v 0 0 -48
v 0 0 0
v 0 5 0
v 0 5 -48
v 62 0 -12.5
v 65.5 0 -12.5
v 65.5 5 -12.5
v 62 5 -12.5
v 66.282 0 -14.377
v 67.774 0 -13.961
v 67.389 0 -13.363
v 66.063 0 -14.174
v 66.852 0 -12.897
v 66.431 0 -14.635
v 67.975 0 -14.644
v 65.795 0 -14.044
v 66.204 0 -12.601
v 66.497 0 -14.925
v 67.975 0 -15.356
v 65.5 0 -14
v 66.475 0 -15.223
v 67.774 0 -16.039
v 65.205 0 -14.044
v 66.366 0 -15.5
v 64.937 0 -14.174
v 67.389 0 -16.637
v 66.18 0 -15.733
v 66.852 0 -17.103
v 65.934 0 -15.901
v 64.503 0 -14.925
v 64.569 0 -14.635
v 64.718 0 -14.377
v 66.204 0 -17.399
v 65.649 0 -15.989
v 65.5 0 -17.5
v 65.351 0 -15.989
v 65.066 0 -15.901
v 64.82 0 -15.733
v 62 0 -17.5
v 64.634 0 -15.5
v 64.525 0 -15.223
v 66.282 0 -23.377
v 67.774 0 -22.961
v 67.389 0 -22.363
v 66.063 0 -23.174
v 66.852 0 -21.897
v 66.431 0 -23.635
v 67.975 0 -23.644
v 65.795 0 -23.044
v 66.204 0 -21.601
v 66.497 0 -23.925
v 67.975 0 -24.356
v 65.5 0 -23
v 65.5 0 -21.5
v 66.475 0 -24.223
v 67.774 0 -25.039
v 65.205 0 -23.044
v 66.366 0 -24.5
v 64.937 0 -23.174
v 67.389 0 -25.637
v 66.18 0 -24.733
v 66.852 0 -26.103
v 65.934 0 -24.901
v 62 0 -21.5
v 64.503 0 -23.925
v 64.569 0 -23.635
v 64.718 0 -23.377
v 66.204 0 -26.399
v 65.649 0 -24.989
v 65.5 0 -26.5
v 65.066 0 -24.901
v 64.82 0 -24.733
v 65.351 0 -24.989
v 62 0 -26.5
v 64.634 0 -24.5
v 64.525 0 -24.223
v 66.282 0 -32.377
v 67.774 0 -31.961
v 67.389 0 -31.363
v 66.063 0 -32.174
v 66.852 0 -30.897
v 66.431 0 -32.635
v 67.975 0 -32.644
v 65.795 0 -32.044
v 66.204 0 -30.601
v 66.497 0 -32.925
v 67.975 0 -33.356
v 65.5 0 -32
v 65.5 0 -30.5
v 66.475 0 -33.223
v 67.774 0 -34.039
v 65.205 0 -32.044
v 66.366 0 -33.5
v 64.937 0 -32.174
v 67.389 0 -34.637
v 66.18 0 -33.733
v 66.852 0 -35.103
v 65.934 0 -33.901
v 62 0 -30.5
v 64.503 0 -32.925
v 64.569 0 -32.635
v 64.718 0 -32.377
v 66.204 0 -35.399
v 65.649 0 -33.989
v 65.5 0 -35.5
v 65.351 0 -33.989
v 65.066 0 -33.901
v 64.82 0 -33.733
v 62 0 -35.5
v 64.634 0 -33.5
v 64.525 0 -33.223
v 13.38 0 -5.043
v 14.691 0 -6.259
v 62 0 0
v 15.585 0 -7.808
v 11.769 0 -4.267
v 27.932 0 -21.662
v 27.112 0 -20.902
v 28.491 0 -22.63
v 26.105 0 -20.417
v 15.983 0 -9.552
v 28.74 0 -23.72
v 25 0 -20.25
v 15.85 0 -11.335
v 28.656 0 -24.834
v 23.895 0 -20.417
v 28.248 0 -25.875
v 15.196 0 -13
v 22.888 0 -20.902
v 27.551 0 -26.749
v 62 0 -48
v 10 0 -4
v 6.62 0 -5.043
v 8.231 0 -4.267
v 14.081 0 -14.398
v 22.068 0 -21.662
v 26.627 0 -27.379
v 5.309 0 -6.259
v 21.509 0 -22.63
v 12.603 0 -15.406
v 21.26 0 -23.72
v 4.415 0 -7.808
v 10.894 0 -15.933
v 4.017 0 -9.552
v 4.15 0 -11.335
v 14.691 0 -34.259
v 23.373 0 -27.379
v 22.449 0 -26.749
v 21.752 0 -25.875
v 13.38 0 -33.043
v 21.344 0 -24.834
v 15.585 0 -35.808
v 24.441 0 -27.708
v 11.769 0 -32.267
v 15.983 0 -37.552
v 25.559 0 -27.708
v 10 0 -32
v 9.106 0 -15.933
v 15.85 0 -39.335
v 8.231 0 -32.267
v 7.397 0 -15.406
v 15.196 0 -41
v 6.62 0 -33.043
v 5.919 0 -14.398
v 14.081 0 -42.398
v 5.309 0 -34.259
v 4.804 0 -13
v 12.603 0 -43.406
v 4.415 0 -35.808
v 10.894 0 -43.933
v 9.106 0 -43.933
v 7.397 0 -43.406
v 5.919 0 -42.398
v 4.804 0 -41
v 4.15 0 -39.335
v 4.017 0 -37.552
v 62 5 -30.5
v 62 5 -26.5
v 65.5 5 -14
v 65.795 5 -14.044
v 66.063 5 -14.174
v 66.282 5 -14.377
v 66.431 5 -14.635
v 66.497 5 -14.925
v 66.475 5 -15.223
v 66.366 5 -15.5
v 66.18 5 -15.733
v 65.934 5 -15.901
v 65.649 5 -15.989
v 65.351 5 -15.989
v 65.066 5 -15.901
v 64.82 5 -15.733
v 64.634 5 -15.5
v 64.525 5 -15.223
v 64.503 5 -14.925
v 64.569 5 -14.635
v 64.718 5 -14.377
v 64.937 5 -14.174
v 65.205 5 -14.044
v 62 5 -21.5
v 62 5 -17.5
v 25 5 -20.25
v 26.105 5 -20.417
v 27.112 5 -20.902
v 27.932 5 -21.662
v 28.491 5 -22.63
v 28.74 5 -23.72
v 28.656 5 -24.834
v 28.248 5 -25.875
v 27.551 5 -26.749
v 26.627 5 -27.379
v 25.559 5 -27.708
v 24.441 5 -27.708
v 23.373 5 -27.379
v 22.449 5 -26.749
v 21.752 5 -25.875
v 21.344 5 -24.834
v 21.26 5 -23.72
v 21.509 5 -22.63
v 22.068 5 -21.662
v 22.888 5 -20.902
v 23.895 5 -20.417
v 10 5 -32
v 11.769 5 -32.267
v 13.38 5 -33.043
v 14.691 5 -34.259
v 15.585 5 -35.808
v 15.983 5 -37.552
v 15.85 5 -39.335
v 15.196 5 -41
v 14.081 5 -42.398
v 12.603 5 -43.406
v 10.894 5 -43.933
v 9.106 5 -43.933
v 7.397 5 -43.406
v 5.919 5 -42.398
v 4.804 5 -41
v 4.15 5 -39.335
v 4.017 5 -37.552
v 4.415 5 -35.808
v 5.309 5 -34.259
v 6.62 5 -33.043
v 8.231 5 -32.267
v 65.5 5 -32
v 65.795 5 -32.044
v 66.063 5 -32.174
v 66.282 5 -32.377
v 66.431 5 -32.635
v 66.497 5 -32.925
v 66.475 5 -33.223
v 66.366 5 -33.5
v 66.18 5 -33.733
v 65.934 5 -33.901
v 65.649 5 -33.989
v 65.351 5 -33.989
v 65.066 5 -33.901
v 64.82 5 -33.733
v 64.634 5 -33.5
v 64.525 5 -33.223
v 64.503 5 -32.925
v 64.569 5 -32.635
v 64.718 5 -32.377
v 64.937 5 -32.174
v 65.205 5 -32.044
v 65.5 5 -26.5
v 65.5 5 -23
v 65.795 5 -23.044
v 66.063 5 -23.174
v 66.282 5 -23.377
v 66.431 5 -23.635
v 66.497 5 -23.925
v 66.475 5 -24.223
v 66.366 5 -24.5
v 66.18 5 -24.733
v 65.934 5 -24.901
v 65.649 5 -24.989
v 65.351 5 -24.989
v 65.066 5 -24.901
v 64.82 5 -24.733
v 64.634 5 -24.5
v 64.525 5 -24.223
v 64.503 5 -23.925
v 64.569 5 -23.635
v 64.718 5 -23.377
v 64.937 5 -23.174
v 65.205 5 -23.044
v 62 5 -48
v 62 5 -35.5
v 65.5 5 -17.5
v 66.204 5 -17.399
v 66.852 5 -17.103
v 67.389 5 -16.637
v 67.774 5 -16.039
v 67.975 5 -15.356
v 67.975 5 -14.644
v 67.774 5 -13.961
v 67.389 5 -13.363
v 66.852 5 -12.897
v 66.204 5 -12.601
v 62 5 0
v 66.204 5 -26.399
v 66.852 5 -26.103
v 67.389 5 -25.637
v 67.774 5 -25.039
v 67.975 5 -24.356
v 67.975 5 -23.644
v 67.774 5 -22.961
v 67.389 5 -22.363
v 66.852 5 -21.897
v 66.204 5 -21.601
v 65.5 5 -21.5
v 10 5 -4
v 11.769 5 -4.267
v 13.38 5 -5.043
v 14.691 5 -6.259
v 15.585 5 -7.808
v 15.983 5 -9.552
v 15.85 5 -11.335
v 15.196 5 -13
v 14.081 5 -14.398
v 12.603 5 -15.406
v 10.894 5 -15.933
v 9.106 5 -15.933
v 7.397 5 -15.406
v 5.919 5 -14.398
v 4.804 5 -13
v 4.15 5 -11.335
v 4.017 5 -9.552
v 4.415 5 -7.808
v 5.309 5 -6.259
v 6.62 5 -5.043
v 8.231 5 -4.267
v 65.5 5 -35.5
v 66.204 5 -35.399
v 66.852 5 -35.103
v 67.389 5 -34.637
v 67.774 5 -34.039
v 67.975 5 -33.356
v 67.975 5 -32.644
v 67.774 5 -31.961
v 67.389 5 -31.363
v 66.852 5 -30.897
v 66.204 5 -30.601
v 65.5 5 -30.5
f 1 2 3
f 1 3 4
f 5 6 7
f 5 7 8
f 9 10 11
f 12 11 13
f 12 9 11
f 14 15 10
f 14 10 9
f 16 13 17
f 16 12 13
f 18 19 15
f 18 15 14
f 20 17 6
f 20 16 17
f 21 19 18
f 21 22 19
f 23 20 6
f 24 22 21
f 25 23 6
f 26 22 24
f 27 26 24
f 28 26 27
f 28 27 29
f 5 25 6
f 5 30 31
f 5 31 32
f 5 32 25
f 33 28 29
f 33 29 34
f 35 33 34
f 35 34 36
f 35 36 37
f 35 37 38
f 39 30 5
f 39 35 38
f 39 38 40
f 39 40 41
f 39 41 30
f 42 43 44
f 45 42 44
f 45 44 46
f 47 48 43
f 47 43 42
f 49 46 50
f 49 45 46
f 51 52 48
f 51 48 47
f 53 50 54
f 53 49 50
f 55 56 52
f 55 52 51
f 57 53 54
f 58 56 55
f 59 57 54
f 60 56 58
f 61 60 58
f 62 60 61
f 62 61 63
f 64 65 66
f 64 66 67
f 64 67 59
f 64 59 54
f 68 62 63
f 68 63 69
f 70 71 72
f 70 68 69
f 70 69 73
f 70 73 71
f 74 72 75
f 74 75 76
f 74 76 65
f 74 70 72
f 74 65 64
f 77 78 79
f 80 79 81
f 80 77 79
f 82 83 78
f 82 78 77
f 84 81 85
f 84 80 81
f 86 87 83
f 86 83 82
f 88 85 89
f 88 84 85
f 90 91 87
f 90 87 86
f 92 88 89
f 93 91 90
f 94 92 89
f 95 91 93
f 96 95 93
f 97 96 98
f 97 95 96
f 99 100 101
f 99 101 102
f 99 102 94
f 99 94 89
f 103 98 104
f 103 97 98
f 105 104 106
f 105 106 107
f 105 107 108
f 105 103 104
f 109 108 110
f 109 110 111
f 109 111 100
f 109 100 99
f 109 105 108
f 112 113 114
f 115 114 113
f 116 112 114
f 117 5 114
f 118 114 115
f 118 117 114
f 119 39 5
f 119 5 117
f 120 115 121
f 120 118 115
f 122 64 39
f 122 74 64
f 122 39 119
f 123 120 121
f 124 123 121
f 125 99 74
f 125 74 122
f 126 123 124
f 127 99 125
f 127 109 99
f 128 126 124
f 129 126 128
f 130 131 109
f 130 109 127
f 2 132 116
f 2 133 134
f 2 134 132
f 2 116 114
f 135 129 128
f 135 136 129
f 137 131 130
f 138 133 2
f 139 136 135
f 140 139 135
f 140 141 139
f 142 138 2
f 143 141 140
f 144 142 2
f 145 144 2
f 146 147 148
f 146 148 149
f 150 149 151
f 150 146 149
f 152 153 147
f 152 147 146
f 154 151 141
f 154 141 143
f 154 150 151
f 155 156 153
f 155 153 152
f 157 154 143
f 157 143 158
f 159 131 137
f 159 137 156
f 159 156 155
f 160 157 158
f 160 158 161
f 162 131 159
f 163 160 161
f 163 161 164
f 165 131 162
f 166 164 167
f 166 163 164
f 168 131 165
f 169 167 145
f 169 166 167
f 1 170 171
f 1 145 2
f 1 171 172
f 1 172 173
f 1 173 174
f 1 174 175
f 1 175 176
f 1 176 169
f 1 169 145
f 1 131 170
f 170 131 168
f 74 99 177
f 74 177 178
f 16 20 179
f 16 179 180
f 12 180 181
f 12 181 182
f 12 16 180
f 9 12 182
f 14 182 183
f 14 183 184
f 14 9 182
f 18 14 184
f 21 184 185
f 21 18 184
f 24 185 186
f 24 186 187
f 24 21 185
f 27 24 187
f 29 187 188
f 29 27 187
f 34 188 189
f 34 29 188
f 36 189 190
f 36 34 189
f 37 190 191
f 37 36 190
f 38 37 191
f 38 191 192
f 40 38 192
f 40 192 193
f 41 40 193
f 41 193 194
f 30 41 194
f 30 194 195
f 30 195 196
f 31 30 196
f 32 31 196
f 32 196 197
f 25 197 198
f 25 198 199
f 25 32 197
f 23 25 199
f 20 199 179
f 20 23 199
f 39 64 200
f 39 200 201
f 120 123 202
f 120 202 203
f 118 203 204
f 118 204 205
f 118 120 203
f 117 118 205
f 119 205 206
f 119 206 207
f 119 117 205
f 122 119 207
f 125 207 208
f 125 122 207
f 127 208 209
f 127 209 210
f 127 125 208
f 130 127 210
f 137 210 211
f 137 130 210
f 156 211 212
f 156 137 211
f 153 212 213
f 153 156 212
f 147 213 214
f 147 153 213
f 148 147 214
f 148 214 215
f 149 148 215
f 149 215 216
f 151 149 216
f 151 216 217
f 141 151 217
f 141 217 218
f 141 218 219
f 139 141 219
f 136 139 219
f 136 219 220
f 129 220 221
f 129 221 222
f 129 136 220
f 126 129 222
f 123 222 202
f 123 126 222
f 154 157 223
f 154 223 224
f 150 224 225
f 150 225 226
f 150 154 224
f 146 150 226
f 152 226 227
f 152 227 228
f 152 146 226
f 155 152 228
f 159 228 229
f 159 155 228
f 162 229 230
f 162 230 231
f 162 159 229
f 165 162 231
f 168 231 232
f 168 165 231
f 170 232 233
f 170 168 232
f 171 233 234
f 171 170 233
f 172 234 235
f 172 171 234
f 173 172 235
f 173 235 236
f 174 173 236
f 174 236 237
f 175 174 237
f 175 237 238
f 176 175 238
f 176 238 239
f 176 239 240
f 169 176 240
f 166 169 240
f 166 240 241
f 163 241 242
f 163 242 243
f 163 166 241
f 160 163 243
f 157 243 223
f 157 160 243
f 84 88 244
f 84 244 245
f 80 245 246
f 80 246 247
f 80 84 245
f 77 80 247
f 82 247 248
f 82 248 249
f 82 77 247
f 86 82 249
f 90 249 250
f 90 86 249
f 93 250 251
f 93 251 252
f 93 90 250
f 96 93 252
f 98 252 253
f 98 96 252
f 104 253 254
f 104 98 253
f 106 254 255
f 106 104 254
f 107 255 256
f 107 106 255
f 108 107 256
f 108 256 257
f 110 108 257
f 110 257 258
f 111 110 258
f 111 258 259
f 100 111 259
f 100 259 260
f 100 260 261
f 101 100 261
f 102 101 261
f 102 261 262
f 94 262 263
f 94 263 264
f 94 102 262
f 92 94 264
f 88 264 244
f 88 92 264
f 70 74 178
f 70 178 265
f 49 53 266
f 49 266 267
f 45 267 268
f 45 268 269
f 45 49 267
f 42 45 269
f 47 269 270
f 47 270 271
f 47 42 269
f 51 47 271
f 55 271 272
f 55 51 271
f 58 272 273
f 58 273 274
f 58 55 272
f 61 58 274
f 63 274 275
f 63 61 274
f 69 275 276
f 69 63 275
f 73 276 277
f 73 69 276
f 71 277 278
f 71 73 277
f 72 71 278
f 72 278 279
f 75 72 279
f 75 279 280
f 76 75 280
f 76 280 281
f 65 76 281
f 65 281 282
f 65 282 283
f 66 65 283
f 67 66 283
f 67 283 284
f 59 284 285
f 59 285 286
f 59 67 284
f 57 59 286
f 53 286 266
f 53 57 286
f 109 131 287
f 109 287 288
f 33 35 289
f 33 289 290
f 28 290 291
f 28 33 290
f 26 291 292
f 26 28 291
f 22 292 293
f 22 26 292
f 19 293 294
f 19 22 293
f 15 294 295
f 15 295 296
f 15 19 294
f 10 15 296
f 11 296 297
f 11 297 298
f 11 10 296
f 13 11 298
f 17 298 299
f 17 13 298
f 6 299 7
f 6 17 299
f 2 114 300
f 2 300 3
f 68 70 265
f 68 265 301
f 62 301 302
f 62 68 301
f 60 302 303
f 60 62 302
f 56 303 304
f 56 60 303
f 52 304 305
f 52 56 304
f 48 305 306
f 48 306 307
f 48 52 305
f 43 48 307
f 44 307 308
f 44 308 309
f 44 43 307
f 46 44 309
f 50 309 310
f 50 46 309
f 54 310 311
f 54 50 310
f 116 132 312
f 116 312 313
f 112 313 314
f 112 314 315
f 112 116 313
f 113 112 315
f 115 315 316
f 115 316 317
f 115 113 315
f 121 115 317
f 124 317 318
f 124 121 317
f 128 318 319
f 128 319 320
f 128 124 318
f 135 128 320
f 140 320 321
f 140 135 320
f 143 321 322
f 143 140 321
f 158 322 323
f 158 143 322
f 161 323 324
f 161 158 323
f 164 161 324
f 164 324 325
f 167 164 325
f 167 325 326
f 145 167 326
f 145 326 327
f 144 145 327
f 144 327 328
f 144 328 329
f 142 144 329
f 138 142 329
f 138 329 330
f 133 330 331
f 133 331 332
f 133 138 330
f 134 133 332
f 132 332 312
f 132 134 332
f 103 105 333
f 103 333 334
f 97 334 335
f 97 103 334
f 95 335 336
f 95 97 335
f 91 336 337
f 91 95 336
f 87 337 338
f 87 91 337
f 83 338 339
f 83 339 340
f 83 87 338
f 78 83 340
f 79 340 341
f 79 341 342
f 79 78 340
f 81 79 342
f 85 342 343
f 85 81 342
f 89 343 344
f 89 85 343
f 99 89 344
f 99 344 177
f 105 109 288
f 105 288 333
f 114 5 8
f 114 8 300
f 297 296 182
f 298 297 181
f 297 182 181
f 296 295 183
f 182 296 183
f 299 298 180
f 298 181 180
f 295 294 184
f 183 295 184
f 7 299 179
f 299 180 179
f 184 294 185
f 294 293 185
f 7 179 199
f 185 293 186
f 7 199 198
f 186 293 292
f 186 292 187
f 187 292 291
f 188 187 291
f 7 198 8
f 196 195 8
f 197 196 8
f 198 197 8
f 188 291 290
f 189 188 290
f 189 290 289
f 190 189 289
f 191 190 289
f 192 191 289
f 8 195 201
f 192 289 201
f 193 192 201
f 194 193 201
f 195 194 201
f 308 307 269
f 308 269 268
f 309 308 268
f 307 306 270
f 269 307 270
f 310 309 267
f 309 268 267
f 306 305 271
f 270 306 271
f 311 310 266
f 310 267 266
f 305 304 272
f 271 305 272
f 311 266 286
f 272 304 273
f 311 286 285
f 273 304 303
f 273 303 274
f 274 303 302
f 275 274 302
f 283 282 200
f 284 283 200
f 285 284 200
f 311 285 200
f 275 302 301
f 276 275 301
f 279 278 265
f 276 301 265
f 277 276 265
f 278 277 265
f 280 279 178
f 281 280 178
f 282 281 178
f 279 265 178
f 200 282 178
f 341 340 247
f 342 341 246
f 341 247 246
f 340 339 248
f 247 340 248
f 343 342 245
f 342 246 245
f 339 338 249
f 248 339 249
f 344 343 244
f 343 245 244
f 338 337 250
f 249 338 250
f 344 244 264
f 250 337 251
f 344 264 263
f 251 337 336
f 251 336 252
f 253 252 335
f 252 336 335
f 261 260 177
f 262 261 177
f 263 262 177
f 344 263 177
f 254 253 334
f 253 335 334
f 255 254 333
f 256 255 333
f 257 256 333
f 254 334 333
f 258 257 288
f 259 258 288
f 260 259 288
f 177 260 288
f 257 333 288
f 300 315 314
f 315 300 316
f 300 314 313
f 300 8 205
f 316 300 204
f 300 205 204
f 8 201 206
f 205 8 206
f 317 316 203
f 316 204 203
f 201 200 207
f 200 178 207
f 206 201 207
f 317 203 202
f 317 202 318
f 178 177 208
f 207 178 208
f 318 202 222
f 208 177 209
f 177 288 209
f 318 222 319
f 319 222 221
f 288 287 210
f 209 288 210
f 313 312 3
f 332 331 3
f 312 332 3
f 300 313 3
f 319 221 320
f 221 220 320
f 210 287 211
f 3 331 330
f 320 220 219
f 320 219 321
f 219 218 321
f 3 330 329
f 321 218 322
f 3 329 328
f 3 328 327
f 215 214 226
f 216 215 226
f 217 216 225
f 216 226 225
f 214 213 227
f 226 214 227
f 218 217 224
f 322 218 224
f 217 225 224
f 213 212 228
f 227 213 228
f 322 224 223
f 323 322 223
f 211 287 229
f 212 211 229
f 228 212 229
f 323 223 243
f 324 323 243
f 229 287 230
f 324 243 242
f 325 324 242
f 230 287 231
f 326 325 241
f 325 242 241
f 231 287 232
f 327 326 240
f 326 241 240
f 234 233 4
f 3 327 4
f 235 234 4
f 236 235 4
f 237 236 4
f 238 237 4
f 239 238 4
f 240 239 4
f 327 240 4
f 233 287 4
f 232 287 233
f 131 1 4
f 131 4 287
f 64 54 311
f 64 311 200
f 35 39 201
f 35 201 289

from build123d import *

# Parameters (mm, degrees)
SKETCH1_R           = 6
SKETCH1_R_2         = 3.75
SKETCH1_R_3         = 1
BOSS_EXTRUDE1_DEPTH = 5


with BuildPart() as part:
    # Sketch1 → Boss-Extrude1 (new body)
    with BuildSketch(Plane(origin=(0, 0, 0), x_dir=(1, 0, 0), z_dir=(0, 1, 0))):
        with BuildLine():
            Line((65.5, 12.5), (62, 12.5))
            Line((62, 12.5), (62, 0))
            Line((62, 0), (0, 0))
            Line((0, 0), (0, 48))
            Line((0, 48), (62, 48))
            Line((62, 48), (62, 35.5))
            Line((62, 35.5), (65.5, 35.5))
            ThreePointArc((65.5, 35.5), (68, 33), (65.5, 30.5))
            Line((65.5, 30.5), (62, 30.5))
            Line((62, 30.5), (62, 26.5))
            Line((62, 26.5), (65.5, 26.5))
            ThreePointArc((65.5, 26.5), (68, 24), (65.5, 21.5))
            Line((65.5, 21.5), (62, 21.5))
            Line((62, 21.5), (62, 17.5))
            Line((62, 17.5), (65.5, 17.5))
            ThreePointArc((65.5, 17.5), (68, 15), (65.5, 12.5))
        make_face()
        with Locations(Location((10, 10, 0), (0, 0, 270))):
            Circle(SKETCH1_R, mode=Mode.SUBTRACT)
        with Locations(Location((10, 38, 0), (0, 0, 270))):
            Circle(SKETCH1_R, mode=Mode.SUBTRACT)
        with Locations(Location((25, 24, 0), (0, 0, 270))):
            Circle(SKETCH1_R_2, mode=Mode.SUBTRACT)
        with Locations(Location((65.5, 15, 0), (0, 0, 270))):
            Circle(SKETCH1_R_3, mode=Mode.SUBTRACT)
        with Locations(Location((65.5, 24, 0), (0, 0, 270))):
            Circle(SKETCH1_R_3, mode=Mode.SUBTRACT)
        with Locations(Location((65.5, 33, 0), (0, 0, 270))):
            Circle(SKETCH1_R_3, mode=Mode.SUBTRACT)
    extrude(amount=BOSS_EXTRUDE1_DEPTH)


solid = part.part
